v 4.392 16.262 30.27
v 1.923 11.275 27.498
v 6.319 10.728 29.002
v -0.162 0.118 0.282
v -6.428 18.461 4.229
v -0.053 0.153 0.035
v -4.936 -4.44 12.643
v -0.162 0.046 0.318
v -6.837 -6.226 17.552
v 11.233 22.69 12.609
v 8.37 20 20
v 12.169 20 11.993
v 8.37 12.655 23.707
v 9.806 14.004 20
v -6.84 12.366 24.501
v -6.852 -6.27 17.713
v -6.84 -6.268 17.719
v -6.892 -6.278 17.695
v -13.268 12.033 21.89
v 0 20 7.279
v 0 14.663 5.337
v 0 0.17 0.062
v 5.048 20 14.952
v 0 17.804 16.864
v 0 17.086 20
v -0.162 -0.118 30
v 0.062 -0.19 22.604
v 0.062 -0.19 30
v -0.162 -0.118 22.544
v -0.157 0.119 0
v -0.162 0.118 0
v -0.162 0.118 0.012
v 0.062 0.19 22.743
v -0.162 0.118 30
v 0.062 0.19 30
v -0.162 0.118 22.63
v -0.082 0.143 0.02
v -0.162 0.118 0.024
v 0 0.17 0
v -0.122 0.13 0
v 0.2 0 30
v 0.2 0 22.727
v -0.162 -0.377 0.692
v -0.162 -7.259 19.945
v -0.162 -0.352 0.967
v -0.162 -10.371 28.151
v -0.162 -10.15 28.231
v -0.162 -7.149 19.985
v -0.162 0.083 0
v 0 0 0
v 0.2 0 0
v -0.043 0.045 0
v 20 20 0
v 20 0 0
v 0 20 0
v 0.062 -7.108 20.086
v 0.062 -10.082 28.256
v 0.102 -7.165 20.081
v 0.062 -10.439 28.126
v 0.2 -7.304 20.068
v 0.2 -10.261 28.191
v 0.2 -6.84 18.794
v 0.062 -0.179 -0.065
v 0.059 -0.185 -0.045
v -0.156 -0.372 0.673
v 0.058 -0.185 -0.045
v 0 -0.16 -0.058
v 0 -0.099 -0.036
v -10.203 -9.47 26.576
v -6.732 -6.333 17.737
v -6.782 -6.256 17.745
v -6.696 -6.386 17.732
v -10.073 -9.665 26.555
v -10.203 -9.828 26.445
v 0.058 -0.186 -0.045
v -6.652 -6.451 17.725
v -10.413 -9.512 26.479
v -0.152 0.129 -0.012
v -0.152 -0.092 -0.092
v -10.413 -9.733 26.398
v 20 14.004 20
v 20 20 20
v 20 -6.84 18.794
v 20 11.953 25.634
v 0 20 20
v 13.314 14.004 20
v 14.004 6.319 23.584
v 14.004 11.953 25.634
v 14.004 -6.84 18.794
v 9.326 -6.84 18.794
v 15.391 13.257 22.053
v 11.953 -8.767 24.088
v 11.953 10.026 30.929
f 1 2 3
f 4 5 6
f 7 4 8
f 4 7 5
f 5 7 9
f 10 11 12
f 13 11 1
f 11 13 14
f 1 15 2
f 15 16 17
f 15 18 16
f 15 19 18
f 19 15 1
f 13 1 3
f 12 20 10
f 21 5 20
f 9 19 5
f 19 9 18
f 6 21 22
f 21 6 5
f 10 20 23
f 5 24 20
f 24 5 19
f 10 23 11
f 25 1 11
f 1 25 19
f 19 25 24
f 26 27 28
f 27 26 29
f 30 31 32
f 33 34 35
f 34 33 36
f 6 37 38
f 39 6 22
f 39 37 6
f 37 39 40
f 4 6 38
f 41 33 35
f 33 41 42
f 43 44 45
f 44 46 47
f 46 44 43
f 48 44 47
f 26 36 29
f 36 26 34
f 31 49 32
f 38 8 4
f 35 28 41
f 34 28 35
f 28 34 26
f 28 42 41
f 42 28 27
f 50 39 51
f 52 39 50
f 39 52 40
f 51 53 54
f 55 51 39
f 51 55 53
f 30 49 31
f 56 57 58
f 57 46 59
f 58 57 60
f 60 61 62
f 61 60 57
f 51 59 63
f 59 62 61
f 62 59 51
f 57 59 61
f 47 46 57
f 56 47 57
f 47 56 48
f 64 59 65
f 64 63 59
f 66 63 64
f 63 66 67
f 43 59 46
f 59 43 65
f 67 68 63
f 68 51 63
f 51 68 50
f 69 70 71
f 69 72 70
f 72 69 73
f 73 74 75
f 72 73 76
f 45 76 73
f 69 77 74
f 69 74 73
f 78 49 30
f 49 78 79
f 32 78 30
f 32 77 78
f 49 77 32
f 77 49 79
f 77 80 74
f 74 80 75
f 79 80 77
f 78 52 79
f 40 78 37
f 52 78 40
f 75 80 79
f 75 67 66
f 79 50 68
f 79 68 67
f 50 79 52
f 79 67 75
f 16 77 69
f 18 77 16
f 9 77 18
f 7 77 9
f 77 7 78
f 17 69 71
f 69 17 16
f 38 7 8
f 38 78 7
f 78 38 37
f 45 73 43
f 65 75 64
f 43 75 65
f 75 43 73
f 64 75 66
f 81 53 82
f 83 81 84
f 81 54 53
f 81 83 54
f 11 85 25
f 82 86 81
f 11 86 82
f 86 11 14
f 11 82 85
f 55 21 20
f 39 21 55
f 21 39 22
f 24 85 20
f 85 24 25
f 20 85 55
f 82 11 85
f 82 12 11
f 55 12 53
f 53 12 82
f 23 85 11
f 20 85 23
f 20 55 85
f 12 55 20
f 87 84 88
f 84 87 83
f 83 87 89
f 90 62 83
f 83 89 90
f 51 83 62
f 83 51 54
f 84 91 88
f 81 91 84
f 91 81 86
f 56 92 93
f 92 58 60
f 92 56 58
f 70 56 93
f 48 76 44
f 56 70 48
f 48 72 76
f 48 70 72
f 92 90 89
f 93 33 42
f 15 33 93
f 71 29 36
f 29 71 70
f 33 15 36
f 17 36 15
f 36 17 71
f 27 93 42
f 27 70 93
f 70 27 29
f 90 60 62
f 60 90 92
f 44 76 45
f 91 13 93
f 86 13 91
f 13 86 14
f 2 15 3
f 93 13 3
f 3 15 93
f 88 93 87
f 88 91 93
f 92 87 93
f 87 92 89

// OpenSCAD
// file: config.scad
pcbAndHotswapThikness = 3;
caseThikness = 2.5;
wallOffsetFromPcb = 1;
wallOffsetFromConnector = 3;
tentingAngle = 60;
tableThikness = 10;
keysThikness = 11;
caseColor = "grey";
pcbColor = "darkgreen";
keysColor = "white";
screwBumpSize = 2.5;
thumbXOffset = 49;
thumbYOffset = 28;
thumbZOffset = 71;
thumbXRotation = -20;
thumbYRotation = 35;
thumbZRotation = -10;
niceNanoCutoutDepth = 8;
switchCutout = 13.8;
switchCutoutDepth = 2.2;
extensionWidth = 60 + (caseThikness + wallOffsetFromPcb) * 2;
extensionLength = 90;
extensionShift = 11 - caseThikness - wallOffsetFromPcb;
pcbWidth = 90;
cutter = 400;
ccFarWall = 120;

ccFrontWall = 5 + caseThikness;
ccBackWall = 58 + ccFrontWall + caseThikness;

magnetStripeWidth = 26;
magnetStripeDepth = 0.7;
// legs
legRubberDepth = 1;
legRubberDiameter = 8;
legsInsideDepth = 5;
legs = [
    [ 5, 69 - legRubberDiameter / 2 - caseThikness ], [ 5, 13 ],
    [ ccFarWall - legRubberDiameter / 2 - caseThikness, 13 ],
    [ ccFarWall - legRubberDiameter / 2 - caseThikness, 69 - legRubberDiameter / 2 - caseThikness ]
];

// case to case mounting
screwHoleDiameter = 2.3;
// file: lib.scad
include <./config.scad>;

// This function is limited to 11 elements!
function unshift(vec) = [ vec[1], vec[2], vec[3], vec[4], vec[5], vec[6], vec[7], vec[8], vec[9], vec[10], vec[11] ];

module showVector(vector)
// showVector(vector = [ 10, 10, 10 ]);
{
    start = [ 0, 0, 0 ];           // Starting point of the vector
    length = norm(vector - start); // Length of the vector
    x = vector[0];
    y = vector[1];
    z = vector[2];
    b = acos(z / length); // inclination angle
    c = atan2(y, x);      // azimuthal angle

    rotate([ 0, b, c ]) cylinder(h = length, r = 0.2);
    // % cube(vector); // corner of cube should coinciqde with end of cylin
}
// This function is limited to 11 elements!
function unshift(vec) = [ vec[1], vec[2], vec[3], vec[4], vec[5], vec[6], vec[7], vec[8], vec[9], vec[10], vec[11] ];

module showVector(vector)
// showVector(vector = [ 10, 10, 10 ]);
{
    start = [ 0, 0, 0 ];           // Starting point of the vector
    length = norm(vector - start); // Length of the vector
    x = vector[0];
    y = vector[1];
    z = vector[2];
    b = acos(z / length); // inclination angle
    c = atan2(y, x);      // azimuthal angle

    rotate([ 0, b, c ]) cylinder(h = length, r = 0.2);
    // % cube(vector); // corner of cube should coinciqde with end of cylin
}

// Allows to rotate a vector around the x, y and z axis while keeping original object rotation axis
// very usefull to rotate something around certain point in human readable format
// normal rotate() module stops being sane after second rotation
// i.e. rotate() rotate() rotate() will yield unexpected results if you are rotating for non 90 degree angles

module gimbalRotate(vector)
{
    x = vector[0];
    y = vector[1];
    z = vector[2];
    xVector = [ 1, 0, 0 ];
    yVector = [ 0, cos(x), sin(x) ];
    zVector = [ sin(y), -sin(x) * cos(y), cos(x) * cos(y) ];
    rotate(a = z, v = zVector) rotate(a = y, v = yVector) rotate(a = x, v = xVector) children(0);
}

// Same like linear_extrude but with negative parameters,
// and allows to extrude in both directions if you provide two parameters
module push(x, y)
{
    if (y == undef)
    {
        if (x > 0)
        {
            linear_extrude(x) children(0);
        }
        else
        {
            translate([ 0, 0, x ]) linear_extrude(x * -1) children(0);
        }
    }
    else
    {
        if (x > 0 && y > 0)
        {
            translate([ 0, 0, -y ]) linear_extrude(height = x + y) children(0);
        }
    }
}

// Utility module used to create shapes by cutting planes form them
// we can not cut a plane, but we can cut a sufficiently big cube, which is the same
module cut(size)
{

    if (size > 0)
    {
        push(size) square([ size, size ], center = true);
    }
    else
    {
        push(size) square([ -size, -size ], center = true);
    }
}

// Utility module used to create walls
// usfull to create boxes
module wall(thikness, size)
{
    intersection()
    {
        cut(size);
        translate([ 0, 0, thikness ]) cut(-size);
    }
}

// Debug module to show the wall anchor
module showWall()
{
    union()
    {
        translate([ 0, 0, 15 ]) cube([ 1, 1, 30 ], center = true);
        sphere(r = 5);
    }
}

// Utility module to translate and rotate an object by a vector containing the translation and rotation values
// Limited to 11 elements
module moveRotateTranslate(rt)
{
    assert(len(rt) < 12, "rotation translation vector can not have more than 11 elements");
    if (rt[0] == undef)
    {
        children(0);
    }
    else
    {
        if (rt[1] == undef)
        {
            if (rt[0][0] == "r")
            {
                rotate(rt[0][1]) children(0);
            }
            if (rt[0][0] == "t")
            {
                translate(rt[0][1]) children(0);
            }
        }
        else
        {
            if (rt[0][0] == "r")
            {
                rotate(rt[0][1]) moveRotateTranslate(unshift(rt)) children(0);
            }
            if (rt[0][0] == "t")
            {
                translate(rt[0][1]) moveRotateTranslate(unshift(rt)) children(0);
            }
        }
    }
}

// see box.scad for usage and debug examples
module box(walls, cutters, thikness, cutter)
{
    for (i = walls)
    {
        difference()
        {
            moveRotateTranslate(i) wall(thikness, cutter);
            for (i = cutters)
            {
                moveRotateTranslate(i) cut(-cutter);
            }
        }
    }
}

// if you have .dxf file and want to find its anchor point that is very uesfull
//  find_anchor([ 90, 0, 0 ]) import("path/to/file.dxf");
//  try rotating around x, y and z axis by 90 and 180 to find the anchor point
module find_anchor(v)
{
    children(0);
    color("yellow") rotate(v) children(0);
}

module anchor_thumb()
{
    translate([ thumbXOffset, thumbYOffset, thumbZOffset ])
        gimbalRotate([ thumbXRotation, thumbYRotation, thumbZRotation ]) rotate([ 0, 90, -90 ]) children(0);
}
module anchor_pcb()
{
    rotate([ 0, -tentingAngle, 0 ]) children(0);
}
module table()
{
    color("brown") translate([ -50, 0, -tableThikness ]) linear_extrude(tableThikness) square([ 300, 250 ]);
}

// LEFT
module left_pcb_dxf()
{
    // bottom left corner
    translate([ 7, 8.5, 0 ]) import("../../production/pcbs/left/left_pcb_edgecut.dxf");
}
module left_keycaps_dxf()
{
    // bottom left corner
    translate([ 7, 8.5, 0 ]) import("../../production/pcbs/left/left_keycaps.dxf");
}
module left_pcb_with_keys_dxf()
{
    // bottom left corner
    translate([ 7, 8.5, 0 ]) import("../../production/pcbs/left/left_pcb_edgecut_with_keys.dxf");
}
module left_switch_cutouts_dxf()
{
    // bottom left corner
    translate([ 7, 8.5, 0 ]) import("../../production/pcbs/left/left_switch_cutouts.dxf");
}
module left_screw_dxf()
{
    // bottom left corner
    translate([ 7, 8.5, 0 ]) import("../../production/pcbs/left/left_screw.dxf");
}
module left_screw_holes_dxf()
{
    // bottom left corner
    translate([ 7, 8.5, 0 ]) import("../../production/pcbs/left/left_screw_holes.dxf");
}
module left_pcb()
{
    color(pcbColor) linear_extrude(pcbAndHotswapThikness) left_pcb_dxf();
}

// THUMB

module thumb_dxf()
{
    // bottom left corner
    translate([ 9, 8.5, 0 ]) import("../../production/pcbs/thumb/thumb_pcb_edgecut.dxf");
}
module thumb_switch_cutouts_dxf()
{
    // bottom left corner
    translate([ 9, 8.5, 0 ]) import("../../production/pcbs/thumb/thumb_switch_cutouts.dxf");
}
module thumb_screw_dxf()
{
    // bottom left corner
    translate([ 9, 8.5, 0 ]) import("../../production/pcbs/thumb/thumb_screw.dxf");
}
module thumb_screw_holes_dxf()
{
    // bottom left corner
    translate([ 9, 8.5, 0 ]) import("../../production/pcbs/thumb/thumb_screw_holes.dxf");
}
module thumb_pcb()
{
    color("lightgreen") linear_extrude(pcbAndHotswapThikness) thumb_dxf();
}

module left_keys()
{
    translate([ 0, 0, pcbAndHotswapThikness ]) color(keysColor) linear_extrude(keysThikness) left_keycaps_dxf();
}
module left_case()
{
    color("grey") translate([ 0, 0, -caseThikness ]) push(caseThikness) left_case_dxf();
}

module thumb_keys()
{
    translate([ 0, 0, pcbAndHotswapThikness ]) color(keysColor) linear_extrude(keysThikness) thumb_dxf();
}

// NNANO
module nice_nano_mount_to_pcb()
{
    // translate for the pcb anchor
    translate([ 86.6, 29, 0 ]) rotate([ 180, 0, 90 ]) children(0);
}
module nice_nano()
{
    color("lightblue")
        // set anchor to bottom outermost corner hole of the pcb
        translate([ 15.24, -7.62, 6.3 ]) color(pcbColor) import("../shared-3d-models/nice-nano.stl");
}
// main file
use <./lib.scad>

// notice how each subsequent cube is rotated relative to the previous one's axis
// that is not easy to get using plain rotate() function

cubeSize = [ 20, 20, 20 ];
rotateVector = [ 20, -20, 20 ];
color("white") gimbalRotate(rotateVector) cube(cubeSize);

xVector = [ 0, 0, 30 ];

color("green") gimbalRotate([ 0, 0, 0 ]) showVector(xVector);
color("red") gimbalRotate([ rotateVector[0], 0, 0 ]) showVector(xVector);
color("blue") gimbalRotate([ rotateVector[0], rotateVector[1], 0 ]) showVector(xVector);

color("green") gimbalRotate([ 0, 0, 0 ]) cube(cubeSize);
color("red") gimbalRotate([ rotateVector[0], 0, 0 ]) cube(cubeSize);
color("blue") gimbalRotate([ rotateVector[0], rotateVector[1], 0 ]) cube(cubeSize);
